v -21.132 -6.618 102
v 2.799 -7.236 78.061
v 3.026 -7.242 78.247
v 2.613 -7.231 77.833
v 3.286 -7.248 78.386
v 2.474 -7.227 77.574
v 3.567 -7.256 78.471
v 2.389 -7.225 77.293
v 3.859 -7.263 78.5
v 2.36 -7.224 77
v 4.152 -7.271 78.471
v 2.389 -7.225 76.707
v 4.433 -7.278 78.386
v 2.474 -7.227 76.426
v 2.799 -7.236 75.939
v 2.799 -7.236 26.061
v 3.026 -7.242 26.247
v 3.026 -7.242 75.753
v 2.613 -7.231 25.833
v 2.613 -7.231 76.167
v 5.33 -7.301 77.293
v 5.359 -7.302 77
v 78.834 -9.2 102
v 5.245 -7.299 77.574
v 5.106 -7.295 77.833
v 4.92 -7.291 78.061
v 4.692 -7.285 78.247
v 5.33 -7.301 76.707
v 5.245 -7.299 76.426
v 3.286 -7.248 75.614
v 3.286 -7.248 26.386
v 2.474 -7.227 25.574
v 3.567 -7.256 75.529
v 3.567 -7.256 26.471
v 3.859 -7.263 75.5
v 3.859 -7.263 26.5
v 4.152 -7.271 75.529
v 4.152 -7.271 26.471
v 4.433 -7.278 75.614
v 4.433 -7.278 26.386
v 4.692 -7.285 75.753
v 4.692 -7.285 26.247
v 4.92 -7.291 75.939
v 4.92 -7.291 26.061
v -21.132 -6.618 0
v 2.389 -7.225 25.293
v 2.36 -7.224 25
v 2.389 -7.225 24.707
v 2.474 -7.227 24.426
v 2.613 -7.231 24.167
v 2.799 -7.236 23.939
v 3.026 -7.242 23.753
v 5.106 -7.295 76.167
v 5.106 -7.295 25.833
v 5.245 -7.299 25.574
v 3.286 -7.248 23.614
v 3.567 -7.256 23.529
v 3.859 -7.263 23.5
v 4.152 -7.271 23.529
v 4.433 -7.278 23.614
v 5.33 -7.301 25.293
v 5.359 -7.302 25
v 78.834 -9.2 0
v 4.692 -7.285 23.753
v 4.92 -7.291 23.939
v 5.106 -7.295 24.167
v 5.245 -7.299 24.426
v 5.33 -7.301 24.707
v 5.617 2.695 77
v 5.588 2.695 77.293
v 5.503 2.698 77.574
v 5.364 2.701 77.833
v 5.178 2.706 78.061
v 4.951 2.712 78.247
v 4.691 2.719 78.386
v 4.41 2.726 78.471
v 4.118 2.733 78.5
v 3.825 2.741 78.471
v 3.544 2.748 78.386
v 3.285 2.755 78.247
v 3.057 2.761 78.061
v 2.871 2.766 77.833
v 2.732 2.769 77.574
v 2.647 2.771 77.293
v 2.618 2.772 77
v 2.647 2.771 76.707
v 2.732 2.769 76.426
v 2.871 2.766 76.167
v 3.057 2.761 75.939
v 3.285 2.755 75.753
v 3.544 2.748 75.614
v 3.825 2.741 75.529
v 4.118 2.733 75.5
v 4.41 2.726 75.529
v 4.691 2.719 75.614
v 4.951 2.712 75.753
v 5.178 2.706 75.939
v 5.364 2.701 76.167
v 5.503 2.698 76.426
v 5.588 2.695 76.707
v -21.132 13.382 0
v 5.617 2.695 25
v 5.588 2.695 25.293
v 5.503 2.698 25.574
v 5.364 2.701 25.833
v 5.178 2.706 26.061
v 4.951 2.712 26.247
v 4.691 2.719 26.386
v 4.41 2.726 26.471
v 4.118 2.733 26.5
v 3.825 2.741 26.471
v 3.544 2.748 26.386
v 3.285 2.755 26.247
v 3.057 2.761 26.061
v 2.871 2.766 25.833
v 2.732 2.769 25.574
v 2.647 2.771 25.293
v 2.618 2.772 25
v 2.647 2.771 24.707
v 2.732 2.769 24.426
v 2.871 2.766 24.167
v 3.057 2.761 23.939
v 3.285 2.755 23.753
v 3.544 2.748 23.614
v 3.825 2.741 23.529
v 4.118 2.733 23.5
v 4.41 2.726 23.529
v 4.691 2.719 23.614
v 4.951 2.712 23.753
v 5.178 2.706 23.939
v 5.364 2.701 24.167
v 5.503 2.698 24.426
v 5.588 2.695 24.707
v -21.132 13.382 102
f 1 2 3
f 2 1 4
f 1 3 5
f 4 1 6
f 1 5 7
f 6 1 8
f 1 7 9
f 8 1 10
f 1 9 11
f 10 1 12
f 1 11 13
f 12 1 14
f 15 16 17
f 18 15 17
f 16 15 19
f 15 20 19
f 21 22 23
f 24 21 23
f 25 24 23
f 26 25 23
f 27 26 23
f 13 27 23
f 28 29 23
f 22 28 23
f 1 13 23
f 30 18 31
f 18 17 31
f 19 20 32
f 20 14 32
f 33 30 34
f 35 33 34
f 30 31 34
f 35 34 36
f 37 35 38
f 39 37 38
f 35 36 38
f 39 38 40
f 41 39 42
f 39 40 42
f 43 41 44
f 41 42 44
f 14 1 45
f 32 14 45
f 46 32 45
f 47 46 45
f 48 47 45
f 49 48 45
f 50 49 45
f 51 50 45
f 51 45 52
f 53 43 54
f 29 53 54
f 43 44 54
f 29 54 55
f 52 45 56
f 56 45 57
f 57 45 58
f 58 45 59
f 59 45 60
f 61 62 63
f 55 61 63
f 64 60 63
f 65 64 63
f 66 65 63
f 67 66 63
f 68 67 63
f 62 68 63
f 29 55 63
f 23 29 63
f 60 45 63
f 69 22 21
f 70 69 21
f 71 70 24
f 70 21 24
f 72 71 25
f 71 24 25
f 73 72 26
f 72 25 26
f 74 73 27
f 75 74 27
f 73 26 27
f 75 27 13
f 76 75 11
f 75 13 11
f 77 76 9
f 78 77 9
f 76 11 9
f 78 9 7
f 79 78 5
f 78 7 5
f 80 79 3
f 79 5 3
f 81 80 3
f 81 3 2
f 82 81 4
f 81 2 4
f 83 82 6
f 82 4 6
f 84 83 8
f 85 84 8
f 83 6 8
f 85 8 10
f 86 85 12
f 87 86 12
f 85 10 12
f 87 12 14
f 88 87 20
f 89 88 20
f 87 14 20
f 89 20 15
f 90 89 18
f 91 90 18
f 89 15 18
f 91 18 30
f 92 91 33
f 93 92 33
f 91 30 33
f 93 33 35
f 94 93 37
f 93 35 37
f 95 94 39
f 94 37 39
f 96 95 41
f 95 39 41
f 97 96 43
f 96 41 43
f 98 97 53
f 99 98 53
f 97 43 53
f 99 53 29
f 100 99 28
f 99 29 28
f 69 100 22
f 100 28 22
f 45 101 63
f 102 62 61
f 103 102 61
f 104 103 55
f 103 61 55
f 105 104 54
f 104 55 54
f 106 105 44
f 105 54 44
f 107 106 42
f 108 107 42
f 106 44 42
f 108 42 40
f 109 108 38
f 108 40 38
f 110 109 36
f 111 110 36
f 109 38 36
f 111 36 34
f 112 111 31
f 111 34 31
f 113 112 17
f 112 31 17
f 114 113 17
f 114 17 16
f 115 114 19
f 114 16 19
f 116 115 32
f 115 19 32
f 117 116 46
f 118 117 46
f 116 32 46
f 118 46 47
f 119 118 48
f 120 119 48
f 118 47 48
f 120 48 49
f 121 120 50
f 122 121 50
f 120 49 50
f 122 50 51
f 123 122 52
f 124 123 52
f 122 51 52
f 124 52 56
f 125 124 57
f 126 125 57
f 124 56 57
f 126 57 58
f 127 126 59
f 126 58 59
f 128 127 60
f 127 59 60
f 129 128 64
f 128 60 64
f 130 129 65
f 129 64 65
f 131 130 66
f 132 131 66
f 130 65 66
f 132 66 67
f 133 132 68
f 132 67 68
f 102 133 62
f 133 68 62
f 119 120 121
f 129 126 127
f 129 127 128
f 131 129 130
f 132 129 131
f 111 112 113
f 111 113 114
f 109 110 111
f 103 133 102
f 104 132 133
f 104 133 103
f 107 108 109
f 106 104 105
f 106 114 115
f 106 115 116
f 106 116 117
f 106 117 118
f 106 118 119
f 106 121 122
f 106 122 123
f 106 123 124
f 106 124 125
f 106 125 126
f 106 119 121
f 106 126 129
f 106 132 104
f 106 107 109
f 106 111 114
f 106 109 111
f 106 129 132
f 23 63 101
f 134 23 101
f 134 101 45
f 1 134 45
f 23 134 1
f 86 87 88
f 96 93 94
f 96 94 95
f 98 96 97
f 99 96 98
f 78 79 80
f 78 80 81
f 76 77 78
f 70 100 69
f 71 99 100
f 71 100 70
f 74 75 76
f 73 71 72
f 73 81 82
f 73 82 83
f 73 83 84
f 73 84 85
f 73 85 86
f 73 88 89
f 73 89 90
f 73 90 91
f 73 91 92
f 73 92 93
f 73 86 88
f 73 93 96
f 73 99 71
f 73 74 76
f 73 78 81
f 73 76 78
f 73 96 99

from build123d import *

# Parameters (mm, degrees)
RESSALTO_EXTRUS_O1_DEPTH = 102
ESBO_O3_R                = 1.5
CORTE_EXTRUS_O2_DEPTH    = 10


with BuildPart() as part:
    # Esboço1 → Ressalto-extrusão1 (new body)
    with BuildSketch(Plane.XY):
        Polygon((-21.132279289, 13.382352941), (-21.132279289, -6.617647059), (78.834377283, -9.19981162), align=None)
    extrude(amount=RESSALTO_EXTRUS_O1_DEPTH)

    # Esboço3 → Corte-extrusão2 (cut)
    with BuildSketch(Plane(origin=(-0.184911664, -7.158722975, 0), x_dir=(0.999666566, -0.025821646, 0), z_dir=(-0.025821646, -0.999666566, 0))):
        with Locations((4.045645474, 25)):
            Circle(ESBO_O3_R)
        with Locations((4.045645474, 77)):
            Circle(ESBO_O3_R)
    extrude(amount=-CORTE_EXTRUS_O2_DEPTH, mode=Mode.SUBTRACT)


solid = part.part
